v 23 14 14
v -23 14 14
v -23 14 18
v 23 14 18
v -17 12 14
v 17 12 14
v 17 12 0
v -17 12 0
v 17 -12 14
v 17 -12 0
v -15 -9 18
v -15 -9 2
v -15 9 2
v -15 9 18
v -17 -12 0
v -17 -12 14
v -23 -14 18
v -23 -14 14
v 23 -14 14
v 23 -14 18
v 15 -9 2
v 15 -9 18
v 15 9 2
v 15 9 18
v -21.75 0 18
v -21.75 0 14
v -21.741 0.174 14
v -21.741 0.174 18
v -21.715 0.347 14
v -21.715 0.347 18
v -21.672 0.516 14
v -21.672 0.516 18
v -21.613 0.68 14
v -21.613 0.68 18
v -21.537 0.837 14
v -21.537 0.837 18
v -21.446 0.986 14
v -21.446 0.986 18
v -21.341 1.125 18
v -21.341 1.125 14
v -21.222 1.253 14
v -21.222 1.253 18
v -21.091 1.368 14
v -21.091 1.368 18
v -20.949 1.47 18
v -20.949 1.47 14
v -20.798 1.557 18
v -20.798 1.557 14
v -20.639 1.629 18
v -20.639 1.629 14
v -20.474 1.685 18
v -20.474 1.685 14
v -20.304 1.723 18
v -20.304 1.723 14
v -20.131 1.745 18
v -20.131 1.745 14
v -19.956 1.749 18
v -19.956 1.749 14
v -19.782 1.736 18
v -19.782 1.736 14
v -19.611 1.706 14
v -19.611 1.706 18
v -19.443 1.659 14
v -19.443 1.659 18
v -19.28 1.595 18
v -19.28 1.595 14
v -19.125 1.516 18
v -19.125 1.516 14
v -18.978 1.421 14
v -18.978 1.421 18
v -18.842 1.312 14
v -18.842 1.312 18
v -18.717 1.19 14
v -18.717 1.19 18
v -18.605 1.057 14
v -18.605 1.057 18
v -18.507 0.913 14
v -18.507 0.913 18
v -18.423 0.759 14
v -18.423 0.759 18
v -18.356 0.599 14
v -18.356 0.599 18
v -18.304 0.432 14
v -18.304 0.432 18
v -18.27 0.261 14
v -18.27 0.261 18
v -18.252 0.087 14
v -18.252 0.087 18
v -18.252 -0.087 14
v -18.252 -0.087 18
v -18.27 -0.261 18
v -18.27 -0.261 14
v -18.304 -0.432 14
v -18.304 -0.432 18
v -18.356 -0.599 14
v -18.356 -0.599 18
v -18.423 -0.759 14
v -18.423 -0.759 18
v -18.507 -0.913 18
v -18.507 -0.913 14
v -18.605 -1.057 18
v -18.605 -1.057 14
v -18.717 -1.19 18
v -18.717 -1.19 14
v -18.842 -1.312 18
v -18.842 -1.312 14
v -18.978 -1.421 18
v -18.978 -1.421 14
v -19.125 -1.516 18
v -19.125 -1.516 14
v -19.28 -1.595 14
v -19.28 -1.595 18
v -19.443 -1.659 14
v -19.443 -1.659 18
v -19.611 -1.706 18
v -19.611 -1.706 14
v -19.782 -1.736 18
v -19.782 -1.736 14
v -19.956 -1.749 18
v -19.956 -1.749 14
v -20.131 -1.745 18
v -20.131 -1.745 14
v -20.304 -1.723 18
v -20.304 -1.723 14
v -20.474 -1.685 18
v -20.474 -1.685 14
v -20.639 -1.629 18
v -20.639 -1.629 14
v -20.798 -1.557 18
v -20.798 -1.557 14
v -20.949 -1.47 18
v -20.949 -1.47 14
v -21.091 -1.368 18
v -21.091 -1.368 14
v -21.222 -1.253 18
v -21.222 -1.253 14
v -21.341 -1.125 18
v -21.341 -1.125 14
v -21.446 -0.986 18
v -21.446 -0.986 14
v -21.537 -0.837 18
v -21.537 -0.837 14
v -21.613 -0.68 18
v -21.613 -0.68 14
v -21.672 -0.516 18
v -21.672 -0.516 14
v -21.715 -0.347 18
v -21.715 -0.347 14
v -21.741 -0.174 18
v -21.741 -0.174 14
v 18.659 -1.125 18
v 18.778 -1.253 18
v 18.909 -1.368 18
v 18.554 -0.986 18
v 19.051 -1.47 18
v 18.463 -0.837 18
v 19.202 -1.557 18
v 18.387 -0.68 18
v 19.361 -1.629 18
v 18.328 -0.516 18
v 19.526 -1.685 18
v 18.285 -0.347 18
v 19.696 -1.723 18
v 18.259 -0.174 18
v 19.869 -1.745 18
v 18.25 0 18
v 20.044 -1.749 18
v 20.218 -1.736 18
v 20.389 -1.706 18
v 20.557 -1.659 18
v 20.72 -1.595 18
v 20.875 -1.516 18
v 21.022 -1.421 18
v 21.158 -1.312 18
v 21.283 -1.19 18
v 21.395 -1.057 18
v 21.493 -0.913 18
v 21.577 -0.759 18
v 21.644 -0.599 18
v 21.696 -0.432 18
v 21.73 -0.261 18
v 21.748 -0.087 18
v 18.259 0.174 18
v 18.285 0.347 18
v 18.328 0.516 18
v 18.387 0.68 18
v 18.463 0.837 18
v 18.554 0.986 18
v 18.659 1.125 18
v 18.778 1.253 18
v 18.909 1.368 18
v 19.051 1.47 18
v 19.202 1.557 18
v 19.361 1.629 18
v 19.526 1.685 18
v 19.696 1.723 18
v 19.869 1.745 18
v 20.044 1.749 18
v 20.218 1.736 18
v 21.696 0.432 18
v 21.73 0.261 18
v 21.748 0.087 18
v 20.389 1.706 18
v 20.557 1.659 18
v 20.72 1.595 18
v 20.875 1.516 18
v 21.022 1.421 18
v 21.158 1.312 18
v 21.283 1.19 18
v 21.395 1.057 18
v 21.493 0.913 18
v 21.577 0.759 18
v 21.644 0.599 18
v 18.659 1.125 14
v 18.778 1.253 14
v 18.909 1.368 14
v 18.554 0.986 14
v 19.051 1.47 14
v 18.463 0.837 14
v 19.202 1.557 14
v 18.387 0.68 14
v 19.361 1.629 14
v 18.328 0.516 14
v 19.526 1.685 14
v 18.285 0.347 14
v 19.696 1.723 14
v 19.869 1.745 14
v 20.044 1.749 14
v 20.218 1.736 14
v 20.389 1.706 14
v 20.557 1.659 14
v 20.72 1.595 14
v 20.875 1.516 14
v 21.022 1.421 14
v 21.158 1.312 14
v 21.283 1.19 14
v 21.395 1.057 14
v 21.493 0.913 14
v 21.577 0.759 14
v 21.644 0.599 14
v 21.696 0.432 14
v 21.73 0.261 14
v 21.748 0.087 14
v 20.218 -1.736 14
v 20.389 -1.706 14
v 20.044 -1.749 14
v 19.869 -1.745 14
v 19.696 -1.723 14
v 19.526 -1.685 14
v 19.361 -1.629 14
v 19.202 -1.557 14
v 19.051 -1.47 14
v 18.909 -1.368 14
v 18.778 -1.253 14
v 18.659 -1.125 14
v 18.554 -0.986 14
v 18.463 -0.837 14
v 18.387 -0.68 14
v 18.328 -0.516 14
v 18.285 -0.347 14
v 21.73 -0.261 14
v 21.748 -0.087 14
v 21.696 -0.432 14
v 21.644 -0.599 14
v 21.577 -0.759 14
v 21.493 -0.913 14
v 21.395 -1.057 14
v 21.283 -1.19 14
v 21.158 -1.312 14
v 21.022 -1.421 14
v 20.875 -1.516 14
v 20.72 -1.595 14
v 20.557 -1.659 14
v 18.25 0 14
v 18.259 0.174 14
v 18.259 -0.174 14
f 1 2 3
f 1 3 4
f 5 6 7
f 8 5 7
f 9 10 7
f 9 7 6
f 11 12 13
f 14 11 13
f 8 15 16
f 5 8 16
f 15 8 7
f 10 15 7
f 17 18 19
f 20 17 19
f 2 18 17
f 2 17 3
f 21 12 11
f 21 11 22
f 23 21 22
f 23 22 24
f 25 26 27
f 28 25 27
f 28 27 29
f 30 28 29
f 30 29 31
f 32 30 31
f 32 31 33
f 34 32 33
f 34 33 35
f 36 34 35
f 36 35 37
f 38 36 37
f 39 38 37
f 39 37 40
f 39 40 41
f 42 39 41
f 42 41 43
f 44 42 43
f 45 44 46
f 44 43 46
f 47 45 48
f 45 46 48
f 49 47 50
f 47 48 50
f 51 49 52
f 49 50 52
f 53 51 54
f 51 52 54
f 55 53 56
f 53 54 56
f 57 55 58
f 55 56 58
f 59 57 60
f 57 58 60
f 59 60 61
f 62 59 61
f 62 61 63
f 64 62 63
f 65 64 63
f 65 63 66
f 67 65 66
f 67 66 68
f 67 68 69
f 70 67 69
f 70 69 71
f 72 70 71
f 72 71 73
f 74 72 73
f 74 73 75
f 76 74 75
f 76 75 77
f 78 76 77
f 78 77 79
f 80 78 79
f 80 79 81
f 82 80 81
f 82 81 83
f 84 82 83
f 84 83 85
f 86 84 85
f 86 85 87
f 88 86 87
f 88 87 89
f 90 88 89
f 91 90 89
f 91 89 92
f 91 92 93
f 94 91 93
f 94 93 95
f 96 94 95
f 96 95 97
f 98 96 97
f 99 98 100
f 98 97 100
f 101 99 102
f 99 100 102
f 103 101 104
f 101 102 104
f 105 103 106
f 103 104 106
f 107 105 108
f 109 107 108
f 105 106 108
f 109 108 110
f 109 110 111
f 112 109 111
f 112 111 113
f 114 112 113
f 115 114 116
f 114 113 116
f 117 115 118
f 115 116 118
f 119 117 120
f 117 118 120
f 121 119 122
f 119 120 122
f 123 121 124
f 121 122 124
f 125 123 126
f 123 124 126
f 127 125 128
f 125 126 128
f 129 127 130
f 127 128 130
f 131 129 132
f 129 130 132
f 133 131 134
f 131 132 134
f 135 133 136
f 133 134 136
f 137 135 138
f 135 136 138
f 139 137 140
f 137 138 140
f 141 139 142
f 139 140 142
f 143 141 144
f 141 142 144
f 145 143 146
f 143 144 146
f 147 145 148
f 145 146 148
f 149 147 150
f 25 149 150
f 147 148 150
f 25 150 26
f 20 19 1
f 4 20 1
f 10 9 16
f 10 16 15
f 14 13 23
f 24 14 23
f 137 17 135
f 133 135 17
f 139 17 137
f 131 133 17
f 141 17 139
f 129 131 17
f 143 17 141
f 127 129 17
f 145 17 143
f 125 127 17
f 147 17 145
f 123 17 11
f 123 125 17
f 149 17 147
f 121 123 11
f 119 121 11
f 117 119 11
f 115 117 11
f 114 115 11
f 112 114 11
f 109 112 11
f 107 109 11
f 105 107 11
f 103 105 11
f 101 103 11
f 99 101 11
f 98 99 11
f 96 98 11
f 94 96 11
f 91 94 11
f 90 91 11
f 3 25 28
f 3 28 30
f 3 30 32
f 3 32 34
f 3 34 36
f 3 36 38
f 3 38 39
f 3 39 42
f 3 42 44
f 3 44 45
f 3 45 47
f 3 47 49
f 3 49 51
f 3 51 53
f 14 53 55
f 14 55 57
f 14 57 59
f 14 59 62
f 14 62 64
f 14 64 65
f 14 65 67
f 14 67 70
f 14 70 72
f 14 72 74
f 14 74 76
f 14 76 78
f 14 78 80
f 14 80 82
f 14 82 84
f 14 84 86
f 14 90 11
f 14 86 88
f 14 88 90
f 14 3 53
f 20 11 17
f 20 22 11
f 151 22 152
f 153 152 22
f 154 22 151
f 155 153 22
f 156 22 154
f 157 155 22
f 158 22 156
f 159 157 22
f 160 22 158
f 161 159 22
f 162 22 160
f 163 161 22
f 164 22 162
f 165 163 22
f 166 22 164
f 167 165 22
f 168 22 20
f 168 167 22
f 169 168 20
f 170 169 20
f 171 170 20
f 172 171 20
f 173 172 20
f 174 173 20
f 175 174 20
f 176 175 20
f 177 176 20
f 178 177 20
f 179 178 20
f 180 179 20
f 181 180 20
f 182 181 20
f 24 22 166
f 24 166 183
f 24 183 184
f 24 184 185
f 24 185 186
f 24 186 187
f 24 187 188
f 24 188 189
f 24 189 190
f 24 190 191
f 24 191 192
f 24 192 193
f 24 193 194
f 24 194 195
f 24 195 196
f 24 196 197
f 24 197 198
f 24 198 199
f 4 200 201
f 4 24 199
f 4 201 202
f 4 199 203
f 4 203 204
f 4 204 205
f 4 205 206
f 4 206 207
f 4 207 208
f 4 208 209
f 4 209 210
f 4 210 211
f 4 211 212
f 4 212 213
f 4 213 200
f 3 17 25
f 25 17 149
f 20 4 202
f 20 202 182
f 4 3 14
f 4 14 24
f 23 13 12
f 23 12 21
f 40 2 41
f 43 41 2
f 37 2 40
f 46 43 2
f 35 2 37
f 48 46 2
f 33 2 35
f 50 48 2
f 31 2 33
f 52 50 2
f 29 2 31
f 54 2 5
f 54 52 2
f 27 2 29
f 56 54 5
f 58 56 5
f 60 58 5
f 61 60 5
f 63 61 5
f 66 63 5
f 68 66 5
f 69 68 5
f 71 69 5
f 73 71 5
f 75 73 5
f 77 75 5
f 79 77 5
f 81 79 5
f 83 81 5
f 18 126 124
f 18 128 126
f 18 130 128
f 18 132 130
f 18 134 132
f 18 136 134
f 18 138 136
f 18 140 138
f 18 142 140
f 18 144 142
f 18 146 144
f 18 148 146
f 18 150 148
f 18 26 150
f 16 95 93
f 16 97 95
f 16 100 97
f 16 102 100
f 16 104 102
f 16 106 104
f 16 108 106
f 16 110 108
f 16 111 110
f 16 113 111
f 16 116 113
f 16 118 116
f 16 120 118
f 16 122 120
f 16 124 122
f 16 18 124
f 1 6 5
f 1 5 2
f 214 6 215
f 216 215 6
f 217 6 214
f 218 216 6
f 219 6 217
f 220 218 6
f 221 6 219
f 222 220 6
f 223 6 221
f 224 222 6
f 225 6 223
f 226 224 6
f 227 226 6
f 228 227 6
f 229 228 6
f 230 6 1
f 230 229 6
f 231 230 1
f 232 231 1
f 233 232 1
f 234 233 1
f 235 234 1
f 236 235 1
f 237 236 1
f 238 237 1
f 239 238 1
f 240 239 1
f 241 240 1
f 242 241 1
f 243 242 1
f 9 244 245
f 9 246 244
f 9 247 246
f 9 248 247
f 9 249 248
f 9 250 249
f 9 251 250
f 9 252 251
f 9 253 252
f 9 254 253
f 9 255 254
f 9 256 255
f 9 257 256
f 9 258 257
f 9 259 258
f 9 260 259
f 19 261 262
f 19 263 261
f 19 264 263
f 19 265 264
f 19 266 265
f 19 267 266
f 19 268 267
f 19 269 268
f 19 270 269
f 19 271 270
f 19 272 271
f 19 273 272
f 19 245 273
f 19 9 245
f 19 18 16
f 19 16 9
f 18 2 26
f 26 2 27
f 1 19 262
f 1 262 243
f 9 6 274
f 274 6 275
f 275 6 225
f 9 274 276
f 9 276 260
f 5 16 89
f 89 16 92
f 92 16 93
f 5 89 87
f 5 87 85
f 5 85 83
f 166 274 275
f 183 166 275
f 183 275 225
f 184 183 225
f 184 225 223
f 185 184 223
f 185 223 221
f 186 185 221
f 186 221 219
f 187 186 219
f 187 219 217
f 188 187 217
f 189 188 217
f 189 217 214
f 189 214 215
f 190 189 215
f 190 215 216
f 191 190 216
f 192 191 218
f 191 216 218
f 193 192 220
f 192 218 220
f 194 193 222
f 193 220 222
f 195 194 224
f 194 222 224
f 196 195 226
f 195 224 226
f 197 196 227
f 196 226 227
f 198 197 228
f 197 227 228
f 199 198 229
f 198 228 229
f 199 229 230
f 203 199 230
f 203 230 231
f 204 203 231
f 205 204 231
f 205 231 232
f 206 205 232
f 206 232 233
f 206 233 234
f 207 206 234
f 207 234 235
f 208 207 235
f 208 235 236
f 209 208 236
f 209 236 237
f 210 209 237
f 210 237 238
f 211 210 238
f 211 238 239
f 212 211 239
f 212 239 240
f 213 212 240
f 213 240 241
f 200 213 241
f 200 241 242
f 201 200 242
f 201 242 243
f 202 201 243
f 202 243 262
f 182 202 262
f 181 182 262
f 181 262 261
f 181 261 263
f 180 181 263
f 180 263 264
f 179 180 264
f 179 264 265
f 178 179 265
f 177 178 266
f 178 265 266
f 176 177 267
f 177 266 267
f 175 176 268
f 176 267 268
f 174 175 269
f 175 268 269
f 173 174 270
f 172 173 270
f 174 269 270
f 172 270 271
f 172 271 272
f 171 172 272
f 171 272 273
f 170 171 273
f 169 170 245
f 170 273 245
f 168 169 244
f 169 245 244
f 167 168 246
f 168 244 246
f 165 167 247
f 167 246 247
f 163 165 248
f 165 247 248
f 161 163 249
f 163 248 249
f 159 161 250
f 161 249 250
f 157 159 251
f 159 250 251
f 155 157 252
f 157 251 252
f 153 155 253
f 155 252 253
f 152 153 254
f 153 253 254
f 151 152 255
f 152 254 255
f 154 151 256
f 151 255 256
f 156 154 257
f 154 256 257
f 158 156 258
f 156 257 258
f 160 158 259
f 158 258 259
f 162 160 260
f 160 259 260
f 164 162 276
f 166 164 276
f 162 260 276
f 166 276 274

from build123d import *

# Parameters (mm, degrees)
CROQUIS1_W              = 46
CROQUIS1_H              = 28
SALIENTE_EXTRUIR1_DEPTH = 2
CROQUIS2_W              = 46
CROQUIS2_H              = 28
CROQUIS2_W_2            = 30
CROQUIS2_H_2            = 18
SALIENTE_EXTRUIR2_DEPTH = 16
CROQUIS3_R              = 1.75
AGUJEROS_DEPTH          = 18
CROQUIS5_W              = 6
CROQUIS5_H              = 14
CORTAR_BORDES_DEPTH     = 41.459856648
CROQUIS6_W              = 14
CROQUIS6_H              = 2
CORTAR_EXTRUIR3_DEPTH   = 47.043457733


with BuildPart() as part:
    # Croquis1 → Saliente-Extruir1 (new body)
    with BuildSketch(Plane.XY):
        Rectangle(CROQUIS1_W, CROQUIS1_H)
    extrude(amount=SALIENTE_EXTRUIR1_DEPTH)

    # Croquis2 → Saliente-Extruir2 (add)
    with BuildSketch(Plane.XY.offset(2)):
        Rectangle(CROQUIS2_W, CROQUIS2_H)
        Rectangle(CROQUIS2_W_2, CROQUIS2_H_2, mode=Mode.SUBTRACT)
    extrude(amount=SALIENTE_EXTRUIR2_DEPTH)

    # Croquis3 → Agujeros (cut)
    with BuildSketch(Plane(origin=(0, 0, 0), x_dir=(-1, 0, 0), z_dir=(0, 0, -1))):
        with Locations((-20, 0)):
            Circle(CROQUIS3_R)
        with Locations((20, 0)):
            Circle(CROQUIS3_R)
    extrude(amount=-AGUJEROS_DEPTH, mode=Mode.SUBTRACT)

    # Croquis5 → Cortar bordes (cut, through all)
    with BuildSketch(Plane.XZ.offset(14)):
        with Locations((-20, 7)):
            Rectangle(CROQUIS5_W, CROQUIS5_H)
        with Locations((20, 7)):
            Rectangle(CROQUIS5_W, CROQUIS5_H)
    extrude(amount=-CORTAR_BORDES_DEPTH, mode=Mode.SUBTRACT)

    # Croquis6 → Cortar-Extruir3 (cut, through all)
    with BuildSketch(Plane(origin=(17, 0, 0), x_dir=(0, 0, -1), z_dir=(1, 0, 0))):
        with Locations((-7, 13)):
            Rectangle(CROQUIS6_W, CROQUIS6_H)
        with Locations((-7, -13)):
            Rectangle(CROQUIS6_W, CROQUIS6_H)
    extrude(amount=-CORTAR_EXTRUIR3_DEPTH, mode=Mode.SUBTRACT)


solid = part.part
